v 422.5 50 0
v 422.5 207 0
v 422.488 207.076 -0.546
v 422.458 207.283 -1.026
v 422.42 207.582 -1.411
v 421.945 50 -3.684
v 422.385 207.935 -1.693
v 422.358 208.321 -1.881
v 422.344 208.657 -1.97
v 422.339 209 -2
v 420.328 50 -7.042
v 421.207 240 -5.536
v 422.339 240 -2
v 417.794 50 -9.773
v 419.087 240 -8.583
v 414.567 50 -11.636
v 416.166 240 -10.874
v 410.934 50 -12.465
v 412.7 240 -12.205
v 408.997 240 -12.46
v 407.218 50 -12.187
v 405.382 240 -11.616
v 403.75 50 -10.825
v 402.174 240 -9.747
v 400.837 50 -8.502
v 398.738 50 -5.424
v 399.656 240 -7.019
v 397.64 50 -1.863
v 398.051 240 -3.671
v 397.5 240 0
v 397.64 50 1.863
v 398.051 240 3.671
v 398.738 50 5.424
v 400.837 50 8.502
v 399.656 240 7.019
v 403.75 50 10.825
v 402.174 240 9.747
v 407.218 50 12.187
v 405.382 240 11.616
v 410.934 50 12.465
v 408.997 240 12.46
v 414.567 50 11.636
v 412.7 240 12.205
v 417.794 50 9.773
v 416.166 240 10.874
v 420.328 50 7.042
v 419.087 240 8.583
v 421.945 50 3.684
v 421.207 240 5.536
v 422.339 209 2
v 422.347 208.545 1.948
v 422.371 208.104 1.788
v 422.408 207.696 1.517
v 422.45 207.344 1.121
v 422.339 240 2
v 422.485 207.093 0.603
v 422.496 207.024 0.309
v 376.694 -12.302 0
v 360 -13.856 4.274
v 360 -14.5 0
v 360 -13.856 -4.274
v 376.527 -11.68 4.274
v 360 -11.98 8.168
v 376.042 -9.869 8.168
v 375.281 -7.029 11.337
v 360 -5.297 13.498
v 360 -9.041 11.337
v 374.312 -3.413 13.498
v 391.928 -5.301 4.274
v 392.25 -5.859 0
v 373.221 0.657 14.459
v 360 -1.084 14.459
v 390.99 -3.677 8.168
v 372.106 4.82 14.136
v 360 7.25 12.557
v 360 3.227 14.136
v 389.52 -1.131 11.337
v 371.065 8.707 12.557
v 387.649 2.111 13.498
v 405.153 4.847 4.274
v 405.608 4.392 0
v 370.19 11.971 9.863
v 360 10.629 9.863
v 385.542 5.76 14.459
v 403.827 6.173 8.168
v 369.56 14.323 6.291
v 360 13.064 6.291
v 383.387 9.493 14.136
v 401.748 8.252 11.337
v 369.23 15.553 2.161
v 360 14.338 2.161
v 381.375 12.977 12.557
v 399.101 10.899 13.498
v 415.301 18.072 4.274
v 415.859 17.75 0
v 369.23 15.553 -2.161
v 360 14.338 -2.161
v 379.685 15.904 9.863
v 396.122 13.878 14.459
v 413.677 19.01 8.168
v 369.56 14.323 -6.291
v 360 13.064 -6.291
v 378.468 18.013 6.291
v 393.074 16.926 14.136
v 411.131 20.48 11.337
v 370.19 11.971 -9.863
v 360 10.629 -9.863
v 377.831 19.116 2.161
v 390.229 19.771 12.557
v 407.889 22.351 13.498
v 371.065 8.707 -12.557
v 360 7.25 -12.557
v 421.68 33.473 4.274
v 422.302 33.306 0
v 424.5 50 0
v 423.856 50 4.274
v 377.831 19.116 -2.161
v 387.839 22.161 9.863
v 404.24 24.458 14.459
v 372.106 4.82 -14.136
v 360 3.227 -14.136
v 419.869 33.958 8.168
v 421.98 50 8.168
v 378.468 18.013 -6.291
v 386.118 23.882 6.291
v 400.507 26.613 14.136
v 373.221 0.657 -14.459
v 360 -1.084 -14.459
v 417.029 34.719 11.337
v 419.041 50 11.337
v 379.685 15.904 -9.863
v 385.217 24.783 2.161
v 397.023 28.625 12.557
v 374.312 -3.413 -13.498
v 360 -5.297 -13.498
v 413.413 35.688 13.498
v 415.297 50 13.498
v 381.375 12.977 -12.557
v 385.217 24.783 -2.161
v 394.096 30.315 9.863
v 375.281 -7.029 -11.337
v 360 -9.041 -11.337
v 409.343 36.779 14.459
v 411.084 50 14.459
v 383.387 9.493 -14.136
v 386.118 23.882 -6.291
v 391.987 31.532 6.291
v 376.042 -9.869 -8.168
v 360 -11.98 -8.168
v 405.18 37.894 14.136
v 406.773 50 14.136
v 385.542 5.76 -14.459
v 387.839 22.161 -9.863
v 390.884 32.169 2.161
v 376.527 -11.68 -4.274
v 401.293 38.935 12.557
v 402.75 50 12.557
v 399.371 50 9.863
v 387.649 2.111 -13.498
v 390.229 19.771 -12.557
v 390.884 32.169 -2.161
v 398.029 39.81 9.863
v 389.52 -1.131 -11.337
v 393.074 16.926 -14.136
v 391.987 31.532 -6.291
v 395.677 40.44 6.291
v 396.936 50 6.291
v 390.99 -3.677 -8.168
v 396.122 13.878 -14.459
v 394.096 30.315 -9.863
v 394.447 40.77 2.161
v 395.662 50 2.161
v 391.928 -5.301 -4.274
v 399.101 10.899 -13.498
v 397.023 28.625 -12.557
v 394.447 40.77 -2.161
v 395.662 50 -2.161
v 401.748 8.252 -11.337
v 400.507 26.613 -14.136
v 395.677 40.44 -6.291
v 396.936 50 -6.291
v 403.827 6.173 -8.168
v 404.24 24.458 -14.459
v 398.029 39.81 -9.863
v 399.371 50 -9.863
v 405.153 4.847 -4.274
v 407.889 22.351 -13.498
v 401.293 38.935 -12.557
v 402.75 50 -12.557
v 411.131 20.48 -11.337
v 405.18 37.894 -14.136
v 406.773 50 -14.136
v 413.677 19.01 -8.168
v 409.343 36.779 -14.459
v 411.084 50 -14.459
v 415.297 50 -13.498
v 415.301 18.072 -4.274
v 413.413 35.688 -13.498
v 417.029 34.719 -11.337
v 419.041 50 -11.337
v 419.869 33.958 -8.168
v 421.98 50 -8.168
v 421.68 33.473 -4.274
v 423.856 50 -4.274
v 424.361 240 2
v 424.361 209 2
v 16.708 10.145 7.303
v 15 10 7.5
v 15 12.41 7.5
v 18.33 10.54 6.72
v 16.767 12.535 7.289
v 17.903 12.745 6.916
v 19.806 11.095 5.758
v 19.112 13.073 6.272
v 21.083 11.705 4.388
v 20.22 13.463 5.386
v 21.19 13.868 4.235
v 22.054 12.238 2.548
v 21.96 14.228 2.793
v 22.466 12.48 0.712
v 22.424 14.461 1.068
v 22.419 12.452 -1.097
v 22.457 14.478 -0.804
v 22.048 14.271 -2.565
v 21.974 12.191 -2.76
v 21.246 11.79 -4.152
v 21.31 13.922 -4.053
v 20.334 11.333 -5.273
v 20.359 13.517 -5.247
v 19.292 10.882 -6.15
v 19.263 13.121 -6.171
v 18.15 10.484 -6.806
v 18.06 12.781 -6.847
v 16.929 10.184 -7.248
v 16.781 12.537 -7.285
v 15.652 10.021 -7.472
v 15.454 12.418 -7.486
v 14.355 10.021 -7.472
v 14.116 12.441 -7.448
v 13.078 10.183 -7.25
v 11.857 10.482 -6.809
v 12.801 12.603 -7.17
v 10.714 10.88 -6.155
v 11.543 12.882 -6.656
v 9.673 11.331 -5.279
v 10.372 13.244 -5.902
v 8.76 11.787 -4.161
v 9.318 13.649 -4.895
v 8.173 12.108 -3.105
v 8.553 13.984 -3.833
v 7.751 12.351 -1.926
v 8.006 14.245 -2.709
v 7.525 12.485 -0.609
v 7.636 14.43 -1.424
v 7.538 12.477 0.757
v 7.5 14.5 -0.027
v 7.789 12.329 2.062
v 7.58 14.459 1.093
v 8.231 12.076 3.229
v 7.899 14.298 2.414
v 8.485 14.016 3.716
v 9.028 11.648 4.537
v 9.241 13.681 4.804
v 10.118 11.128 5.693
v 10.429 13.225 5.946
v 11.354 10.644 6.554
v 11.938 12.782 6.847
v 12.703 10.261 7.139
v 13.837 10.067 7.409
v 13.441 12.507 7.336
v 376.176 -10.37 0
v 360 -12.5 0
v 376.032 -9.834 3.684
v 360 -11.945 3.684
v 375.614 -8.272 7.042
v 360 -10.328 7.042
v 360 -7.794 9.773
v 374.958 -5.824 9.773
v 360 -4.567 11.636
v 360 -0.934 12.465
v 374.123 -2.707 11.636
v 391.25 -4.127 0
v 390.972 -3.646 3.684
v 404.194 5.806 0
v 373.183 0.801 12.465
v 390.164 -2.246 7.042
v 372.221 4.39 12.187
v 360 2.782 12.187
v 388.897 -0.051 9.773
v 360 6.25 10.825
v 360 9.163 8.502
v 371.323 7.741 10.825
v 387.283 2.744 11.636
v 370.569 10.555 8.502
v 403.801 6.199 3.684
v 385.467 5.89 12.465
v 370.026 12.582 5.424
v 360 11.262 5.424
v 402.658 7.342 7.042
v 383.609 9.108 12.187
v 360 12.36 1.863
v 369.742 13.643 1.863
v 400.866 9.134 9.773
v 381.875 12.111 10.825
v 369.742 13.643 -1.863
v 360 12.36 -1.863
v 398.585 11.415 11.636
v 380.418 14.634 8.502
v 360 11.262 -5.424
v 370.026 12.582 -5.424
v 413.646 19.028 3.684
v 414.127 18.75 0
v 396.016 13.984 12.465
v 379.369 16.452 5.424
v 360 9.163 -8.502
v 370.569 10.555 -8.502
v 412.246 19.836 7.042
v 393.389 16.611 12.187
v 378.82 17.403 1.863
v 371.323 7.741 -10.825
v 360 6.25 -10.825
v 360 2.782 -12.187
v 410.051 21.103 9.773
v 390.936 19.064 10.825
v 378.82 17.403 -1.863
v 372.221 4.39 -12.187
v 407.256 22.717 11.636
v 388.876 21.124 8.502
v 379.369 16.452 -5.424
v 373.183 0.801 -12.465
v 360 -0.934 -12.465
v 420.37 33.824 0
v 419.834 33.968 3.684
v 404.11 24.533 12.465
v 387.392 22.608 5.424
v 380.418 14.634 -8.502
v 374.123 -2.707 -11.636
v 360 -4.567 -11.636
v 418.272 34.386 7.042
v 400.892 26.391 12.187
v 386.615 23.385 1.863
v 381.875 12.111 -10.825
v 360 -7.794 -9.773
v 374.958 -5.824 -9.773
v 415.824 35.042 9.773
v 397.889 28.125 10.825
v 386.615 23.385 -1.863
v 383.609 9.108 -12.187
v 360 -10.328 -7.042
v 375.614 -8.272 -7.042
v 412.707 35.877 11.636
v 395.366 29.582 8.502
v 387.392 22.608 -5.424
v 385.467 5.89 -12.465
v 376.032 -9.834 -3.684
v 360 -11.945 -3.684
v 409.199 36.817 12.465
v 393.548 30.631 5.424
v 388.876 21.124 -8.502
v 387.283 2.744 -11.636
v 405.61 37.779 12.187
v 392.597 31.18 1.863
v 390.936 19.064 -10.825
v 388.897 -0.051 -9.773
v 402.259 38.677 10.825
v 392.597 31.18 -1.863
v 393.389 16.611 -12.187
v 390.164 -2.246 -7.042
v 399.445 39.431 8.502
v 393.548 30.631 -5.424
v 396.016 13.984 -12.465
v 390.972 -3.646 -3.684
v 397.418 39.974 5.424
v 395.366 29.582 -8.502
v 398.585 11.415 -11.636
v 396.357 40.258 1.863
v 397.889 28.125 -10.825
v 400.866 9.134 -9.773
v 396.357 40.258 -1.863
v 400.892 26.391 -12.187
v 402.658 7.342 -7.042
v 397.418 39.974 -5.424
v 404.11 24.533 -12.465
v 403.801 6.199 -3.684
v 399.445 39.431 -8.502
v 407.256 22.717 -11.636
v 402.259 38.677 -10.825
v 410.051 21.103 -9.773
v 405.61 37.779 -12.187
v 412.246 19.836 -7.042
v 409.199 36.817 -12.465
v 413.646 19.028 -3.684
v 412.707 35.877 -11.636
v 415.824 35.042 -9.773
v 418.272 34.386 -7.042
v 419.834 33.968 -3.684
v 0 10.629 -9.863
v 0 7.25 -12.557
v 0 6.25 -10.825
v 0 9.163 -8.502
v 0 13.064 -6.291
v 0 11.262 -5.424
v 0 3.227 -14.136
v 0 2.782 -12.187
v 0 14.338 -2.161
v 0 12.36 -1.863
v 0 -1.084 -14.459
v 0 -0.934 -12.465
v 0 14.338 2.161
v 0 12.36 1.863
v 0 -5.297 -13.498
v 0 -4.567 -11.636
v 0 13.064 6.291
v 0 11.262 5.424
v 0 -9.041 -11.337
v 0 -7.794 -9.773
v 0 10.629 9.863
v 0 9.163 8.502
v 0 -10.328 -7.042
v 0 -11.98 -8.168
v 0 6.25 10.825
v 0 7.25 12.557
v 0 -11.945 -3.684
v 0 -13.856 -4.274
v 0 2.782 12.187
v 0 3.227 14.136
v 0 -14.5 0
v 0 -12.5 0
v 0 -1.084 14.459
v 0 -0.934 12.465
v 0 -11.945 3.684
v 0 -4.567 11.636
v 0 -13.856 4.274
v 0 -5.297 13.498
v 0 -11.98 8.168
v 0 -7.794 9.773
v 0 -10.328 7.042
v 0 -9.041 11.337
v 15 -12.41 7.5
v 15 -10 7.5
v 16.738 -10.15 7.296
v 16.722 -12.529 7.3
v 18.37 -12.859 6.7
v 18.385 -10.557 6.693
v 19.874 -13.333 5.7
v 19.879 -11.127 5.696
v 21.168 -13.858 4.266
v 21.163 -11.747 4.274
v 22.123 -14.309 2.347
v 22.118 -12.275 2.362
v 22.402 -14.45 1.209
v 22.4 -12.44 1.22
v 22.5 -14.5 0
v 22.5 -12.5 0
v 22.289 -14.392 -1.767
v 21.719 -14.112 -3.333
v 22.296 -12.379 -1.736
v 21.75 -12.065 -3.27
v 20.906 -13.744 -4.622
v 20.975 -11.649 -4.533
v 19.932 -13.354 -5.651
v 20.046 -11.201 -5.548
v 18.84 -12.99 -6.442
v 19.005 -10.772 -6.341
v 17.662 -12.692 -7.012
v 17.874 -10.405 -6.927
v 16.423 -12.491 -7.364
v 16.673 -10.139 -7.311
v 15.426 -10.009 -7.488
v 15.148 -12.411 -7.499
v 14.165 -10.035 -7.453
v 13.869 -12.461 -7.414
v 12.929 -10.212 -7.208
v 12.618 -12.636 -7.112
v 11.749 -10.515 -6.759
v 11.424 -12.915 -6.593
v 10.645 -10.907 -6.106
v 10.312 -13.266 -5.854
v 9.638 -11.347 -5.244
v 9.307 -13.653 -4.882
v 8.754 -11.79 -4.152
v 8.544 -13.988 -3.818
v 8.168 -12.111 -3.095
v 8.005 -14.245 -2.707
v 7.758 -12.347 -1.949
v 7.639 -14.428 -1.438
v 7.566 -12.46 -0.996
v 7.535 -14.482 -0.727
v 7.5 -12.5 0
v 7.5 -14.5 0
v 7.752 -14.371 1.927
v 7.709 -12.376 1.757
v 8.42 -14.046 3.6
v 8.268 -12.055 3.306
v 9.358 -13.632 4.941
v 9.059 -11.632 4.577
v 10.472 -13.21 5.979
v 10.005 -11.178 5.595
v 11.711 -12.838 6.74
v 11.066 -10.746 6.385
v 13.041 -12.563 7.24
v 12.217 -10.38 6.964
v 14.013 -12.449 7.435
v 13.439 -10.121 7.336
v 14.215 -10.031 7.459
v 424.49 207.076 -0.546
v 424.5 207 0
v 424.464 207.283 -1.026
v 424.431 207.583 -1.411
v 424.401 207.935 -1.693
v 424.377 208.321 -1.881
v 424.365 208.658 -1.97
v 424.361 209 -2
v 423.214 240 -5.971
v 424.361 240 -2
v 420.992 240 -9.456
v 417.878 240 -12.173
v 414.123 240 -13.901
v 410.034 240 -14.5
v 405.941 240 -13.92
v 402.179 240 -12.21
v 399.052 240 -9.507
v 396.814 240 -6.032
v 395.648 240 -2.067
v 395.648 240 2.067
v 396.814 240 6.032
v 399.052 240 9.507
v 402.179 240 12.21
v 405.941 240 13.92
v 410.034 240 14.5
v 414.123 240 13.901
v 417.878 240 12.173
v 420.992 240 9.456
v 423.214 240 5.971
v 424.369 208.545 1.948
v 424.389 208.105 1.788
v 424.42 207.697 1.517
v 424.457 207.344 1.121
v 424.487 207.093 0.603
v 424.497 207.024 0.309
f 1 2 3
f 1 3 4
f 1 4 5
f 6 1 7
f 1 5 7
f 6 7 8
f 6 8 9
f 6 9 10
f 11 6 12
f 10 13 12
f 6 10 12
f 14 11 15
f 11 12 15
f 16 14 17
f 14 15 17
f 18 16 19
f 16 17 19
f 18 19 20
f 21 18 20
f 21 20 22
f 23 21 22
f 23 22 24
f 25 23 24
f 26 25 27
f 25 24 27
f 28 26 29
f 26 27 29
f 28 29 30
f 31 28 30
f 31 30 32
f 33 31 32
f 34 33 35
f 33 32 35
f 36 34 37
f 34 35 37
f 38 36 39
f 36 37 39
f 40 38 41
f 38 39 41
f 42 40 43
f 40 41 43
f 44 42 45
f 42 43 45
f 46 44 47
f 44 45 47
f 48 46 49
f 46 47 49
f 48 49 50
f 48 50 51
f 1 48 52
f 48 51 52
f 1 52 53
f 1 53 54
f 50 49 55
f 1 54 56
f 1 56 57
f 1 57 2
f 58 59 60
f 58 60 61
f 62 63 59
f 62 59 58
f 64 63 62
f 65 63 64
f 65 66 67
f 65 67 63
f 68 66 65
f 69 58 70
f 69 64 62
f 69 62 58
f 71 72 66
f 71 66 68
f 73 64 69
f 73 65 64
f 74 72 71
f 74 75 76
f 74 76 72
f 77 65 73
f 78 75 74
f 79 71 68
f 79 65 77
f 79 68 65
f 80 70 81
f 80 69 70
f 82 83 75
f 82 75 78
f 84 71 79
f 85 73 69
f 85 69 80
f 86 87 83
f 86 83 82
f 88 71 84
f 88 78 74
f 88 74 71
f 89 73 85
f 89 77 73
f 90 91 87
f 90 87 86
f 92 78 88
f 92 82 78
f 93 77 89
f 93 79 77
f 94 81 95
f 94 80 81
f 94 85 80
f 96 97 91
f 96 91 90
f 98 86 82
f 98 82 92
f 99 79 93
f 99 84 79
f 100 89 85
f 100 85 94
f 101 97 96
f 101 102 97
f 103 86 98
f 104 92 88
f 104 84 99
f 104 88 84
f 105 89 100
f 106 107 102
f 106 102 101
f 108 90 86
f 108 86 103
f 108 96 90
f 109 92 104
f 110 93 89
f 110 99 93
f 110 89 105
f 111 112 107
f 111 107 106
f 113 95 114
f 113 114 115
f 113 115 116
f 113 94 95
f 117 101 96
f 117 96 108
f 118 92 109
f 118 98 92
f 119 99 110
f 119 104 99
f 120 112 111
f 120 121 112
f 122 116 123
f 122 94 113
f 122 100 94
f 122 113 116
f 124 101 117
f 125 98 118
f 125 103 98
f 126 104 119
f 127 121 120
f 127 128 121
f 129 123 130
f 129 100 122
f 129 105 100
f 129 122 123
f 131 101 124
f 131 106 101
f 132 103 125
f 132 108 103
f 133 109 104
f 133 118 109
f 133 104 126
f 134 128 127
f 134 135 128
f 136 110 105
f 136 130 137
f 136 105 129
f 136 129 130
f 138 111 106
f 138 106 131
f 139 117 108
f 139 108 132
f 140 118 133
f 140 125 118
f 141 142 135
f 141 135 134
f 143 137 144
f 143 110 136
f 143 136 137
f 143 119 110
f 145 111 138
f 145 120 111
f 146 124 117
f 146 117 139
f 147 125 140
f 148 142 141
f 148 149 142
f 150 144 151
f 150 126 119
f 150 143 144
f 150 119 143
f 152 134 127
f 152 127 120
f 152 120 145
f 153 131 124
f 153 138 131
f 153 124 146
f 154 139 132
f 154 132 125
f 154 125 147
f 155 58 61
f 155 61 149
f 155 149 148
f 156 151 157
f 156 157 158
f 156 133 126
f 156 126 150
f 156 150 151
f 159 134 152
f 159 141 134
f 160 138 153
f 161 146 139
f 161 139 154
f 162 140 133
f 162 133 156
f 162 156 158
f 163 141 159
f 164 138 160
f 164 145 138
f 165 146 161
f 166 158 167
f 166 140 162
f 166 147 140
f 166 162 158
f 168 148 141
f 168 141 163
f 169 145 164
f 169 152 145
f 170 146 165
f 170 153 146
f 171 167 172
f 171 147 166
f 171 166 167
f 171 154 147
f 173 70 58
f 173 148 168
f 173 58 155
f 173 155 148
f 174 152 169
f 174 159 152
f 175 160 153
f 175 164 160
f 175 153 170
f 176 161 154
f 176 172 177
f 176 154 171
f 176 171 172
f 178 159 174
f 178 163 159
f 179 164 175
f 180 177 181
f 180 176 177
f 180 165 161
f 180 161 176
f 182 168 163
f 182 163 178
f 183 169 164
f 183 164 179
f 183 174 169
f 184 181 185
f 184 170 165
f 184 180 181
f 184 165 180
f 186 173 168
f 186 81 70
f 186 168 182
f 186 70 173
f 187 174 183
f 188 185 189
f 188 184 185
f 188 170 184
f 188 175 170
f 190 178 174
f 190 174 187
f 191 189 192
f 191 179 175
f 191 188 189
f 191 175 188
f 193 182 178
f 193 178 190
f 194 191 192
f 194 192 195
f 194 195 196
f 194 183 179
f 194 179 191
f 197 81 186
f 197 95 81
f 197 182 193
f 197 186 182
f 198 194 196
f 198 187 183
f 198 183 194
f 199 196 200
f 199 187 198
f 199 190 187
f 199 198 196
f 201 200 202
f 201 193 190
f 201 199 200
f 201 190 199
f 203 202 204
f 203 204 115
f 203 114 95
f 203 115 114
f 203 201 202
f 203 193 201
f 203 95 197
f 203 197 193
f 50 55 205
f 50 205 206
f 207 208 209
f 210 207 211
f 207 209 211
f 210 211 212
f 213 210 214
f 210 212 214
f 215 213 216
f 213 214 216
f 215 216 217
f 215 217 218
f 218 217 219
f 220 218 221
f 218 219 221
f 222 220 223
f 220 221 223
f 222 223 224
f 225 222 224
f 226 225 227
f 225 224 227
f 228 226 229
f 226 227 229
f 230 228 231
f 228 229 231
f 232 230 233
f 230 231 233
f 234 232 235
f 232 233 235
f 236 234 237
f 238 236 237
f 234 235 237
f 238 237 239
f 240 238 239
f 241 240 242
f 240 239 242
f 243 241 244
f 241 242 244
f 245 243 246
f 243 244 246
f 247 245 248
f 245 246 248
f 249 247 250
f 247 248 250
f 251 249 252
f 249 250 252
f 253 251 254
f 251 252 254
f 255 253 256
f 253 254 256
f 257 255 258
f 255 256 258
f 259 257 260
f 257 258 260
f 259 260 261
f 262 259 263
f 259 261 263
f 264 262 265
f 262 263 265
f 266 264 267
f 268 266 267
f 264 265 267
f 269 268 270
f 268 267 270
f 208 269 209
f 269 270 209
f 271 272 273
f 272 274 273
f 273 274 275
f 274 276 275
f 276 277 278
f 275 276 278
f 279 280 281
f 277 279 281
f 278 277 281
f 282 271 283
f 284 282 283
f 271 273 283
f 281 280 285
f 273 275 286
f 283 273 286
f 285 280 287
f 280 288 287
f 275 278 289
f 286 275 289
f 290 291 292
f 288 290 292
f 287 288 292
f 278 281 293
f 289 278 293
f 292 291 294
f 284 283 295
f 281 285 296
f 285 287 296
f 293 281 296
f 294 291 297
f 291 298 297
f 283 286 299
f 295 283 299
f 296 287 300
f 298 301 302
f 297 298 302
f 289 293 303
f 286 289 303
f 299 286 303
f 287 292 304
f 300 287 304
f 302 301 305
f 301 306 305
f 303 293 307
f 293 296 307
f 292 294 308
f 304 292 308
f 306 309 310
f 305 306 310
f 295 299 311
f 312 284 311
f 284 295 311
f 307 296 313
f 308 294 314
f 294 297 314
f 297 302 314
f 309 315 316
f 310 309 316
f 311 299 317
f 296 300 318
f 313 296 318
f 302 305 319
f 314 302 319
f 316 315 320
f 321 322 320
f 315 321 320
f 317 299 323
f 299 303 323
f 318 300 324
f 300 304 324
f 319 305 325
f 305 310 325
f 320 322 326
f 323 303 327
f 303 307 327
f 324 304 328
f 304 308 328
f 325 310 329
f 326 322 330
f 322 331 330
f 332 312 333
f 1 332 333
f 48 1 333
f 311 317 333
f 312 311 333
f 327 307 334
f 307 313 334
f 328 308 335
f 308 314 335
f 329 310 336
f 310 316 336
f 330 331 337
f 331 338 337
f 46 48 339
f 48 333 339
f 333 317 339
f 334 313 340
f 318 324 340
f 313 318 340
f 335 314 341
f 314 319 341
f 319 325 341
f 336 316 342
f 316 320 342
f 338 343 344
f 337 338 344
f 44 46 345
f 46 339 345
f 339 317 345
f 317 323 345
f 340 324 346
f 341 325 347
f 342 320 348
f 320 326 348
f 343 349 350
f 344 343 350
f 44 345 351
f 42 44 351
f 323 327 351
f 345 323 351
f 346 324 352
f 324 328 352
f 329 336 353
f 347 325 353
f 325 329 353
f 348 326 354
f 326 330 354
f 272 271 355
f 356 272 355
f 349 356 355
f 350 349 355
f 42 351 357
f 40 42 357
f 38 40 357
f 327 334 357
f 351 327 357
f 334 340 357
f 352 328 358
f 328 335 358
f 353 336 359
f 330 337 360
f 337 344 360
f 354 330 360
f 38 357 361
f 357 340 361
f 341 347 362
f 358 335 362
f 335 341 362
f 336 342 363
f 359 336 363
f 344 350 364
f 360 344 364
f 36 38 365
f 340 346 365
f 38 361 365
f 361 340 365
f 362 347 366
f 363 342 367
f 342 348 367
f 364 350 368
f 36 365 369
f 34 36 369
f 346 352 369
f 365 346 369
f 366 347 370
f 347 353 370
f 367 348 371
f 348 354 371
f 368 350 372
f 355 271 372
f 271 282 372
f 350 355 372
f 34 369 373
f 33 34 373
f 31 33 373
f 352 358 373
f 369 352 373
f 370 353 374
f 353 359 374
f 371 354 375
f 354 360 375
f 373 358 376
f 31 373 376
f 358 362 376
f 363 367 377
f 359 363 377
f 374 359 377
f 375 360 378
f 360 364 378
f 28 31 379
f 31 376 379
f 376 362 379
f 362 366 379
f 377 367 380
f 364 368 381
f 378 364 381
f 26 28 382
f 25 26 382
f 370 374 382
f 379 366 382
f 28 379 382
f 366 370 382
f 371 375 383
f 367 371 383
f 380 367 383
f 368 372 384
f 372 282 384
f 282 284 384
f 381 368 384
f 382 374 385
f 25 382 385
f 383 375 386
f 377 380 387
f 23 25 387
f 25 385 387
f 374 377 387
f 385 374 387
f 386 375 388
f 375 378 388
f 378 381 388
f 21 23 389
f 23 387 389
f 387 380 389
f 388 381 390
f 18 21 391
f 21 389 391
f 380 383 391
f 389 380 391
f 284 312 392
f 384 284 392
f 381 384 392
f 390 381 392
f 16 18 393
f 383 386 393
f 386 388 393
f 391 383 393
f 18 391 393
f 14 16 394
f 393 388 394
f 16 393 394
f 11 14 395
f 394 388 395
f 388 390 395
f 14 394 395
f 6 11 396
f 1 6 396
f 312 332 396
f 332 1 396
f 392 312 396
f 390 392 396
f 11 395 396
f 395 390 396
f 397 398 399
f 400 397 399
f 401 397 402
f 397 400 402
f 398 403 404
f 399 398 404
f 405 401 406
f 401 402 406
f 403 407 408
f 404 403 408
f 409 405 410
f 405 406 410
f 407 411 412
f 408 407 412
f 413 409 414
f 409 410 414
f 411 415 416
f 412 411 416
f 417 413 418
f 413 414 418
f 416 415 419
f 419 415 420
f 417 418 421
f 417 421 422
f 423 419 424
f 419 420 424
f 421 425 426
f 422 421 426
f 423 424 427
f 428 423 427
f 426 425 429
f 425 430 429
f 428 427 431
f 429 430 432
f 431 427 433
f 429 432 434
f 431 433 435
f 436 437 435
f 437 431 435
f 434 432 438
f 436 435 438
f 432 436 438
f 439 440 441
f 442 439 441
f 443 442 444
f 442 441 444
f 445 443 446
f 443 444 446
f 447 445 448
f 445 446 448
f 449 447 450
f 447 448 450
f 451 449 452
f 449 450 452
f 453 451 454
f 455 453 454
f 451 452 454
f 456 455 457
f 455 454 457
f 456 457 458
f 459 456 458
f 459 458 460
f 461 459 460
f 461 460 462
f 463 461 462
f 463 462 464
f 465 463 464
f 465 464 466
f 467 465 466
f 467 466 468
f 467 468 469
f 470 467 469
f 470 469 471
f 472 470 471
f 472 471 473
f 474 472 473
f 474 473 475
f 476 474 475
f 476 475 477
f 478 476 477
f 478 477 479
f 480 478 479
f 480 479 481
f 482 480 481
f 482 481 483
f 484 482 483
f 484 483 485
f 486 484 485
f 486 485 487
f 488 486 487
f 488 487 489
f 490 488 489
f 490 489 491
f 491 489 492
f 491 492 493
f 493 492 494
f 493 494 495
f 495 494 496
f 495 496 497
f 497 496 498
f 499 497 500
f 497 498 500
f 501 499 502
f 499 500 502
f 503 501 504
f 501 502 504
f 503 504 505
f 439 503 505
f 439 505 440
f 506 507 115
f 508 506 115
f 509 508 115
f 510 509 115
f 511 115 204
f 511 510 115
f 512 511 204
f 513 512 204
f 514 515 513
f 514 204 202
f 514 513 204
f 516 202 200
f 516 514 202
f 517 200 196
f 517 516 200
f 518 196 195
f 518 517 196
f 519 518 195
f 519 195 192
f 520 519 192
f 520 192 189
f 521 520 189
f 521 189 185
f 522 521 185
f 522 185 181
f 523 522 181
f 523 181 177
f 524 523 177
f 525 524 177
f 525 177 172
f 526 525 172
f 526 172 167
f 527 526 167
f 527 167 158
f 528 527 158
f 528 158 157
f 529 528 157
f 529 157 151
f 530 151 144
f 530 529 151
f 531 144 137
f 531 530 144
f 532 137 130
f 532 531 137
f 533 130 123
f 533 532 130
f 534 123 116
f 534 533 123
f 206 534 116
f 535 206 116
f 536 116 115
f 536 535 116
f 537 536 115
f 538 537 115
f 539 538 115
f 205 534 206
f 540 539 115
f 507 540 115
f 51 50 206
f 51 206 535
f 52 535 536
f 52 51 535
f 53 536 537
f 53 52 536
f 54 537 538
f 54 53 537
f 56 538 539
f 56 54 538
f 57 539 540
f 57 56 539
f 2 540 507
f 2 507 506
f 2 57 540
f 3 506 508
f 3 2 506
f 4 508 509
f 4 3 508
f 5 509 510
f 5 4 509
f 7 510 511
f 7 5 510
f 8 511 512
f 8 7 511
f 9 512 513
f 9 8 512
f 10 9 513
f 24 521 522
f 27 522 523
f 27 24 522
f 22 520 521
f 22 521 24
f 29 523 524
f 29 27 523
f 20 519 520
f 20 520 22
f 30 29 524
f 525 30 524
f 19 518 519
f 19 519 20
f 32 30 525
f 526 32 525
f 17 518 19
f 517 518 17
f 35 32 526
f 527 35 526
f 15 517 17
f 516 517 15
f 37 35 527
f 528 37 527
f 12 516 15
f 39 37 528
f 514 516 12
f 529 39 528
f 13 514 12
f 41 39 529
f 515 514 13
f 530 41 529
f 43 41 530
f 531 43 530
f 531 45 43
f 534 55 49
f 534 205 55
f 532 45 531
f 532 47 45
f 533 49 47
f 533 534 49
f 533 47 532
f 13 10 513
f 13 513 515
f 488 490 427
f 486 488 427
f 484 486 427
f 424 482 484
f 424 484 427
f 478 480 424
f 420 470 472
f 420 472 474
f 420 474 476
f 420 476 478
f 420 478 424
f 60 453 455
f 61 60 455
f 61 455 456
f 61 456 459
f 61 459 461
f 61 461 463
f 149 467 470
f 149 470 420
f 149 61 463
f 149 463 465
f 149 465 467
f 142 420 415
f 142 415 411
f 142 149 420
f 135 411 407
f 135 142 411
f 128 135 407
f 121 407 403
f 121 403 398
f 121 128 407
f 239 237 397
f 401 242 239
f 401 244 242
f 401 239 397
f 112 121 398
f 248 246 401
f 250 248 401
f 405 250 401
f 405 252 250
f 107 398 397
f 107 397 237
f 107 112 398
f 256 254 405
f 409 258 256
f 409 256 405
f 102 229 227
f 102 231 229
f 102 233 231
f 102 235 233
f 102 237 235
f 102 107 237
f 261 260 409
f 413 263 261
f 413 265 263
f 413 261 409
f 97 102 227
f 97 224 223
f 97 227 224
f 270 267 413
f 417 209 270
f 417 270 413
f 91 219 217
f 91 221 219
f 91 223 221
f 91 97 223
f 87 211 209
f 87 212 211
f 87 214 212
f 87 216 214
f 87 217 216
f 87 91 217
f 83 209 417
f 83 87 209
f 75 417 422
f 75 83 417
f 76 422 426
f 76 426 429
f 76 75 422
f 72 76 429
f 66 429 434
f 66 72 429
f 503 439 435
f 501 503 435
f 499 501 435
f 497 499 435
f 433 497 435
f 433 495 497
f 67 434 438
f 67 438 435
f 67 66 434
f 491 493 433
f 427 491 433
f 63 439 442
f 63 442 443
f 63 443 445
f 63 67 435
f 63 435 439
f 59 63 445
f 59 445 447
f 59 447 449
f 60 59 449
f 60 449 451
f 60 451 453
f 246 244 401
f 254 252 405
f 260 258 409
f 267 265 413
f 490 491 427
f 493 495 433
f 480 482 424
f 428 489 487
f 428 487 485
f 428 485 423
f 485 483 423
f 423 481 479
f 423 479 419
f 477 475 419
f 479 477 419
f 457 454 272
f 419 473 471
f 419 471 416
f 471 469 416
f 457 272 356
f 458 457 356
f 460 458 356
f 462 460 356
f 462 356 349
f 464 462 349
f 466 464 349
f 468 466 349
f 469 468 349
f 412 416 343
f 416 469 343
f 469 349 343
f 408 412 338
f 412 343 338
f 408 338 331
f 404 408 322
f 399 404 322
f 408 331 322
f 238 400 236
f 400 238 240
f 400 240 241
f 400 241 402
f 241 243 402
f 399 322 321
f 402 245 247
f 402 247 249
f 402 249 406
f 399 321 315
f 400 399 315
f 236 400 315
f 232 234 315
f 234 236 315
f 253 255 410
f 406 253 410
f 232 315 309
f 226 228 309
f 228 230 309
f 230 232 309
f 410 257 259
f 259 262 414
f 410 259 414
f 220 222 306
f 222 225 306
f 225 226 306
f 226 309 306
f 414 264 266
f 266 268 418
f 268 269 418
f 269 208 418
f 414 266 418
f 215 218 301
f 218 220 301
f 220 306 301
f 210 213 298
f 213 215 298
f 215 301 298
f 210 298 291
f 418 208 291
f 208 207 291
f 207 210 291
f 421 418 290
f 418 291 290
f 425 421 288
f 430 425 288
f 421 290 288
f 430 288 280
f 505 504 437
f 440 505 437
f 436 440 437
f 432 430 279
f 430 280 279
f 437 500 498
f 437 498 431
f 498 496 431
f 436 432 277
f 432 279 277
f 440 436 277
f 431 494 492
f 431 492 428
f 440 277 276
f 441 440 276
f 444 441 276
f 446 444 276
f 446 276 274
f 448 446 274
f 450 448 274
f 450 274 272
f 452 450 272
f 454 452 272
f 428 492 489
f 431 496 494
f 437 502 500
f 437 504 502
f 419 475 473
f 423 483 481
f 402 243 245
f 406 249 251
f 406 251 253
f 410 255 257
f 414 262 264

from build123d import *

# Parameters (mm, degrees)
SKETCH_3_R          = 12.5
SHELL_7_T           = 2
CUT_EXTRUDE_4_DEPTH = 476.300168318
SKETCH_19_R         = 7.5
CUT_EXTRUDE_5_DEPTH = 25


with BuildPart() as part:
    # 掃出5: sweep along a path in 草圖1
    with BuildLine(Plane.XY) as sweep_5_path:
        Line((0, 0), (360, 0))
        ThreePointArc((360, 0), (395.355339059, 14.644660941), (410, 50))
        Line((410, 50), (410, 240))
    # 草圖3 → 掃出5 (sweep)
    with BuildSketch(Plane(origin=(60, 240, 0), x_dir=(1, 0, 0), z_dir=(0, 1, 0))):
        with Locations((350, 0)):
            Circle(SKETCH_3_R)
    sweep(path=sweep_5_path.line)

    # 薄殼7
    shell_7_openings = [part.faces().sort_by_distance(p)[0] for p in [
        (0, 0, 0),
        (410, 240, 0),
    ]]
    offset(amount=SHELL_7_T, openings=shell_7_openings, kind=Kind.INTERSECTION)

    # 草圖18 → 除料-伸長4 (cut, through all)
    with BuildSketch(Plane(origin=(410, 0, 0), x_dir=(0, 0, -1), z_dir=(1, 0, 0))):
        with BuildLine():
            Line((-2, 760.068622847), (-2, 240))
            Line((-2, 240), (-2, 209))
            ThreePointArc((-2, 209), (0, 207), (2, 209))
            Line((2, 209), (2, 240))
            Line((2, 240), (2, 760.068622847))
            Line((2, 760.068622847), (2, 1800.205868541))
            Line((2, 1800.205868541), (-2, 1800.205868541))
            Line((-2, 1800.205868541), (-2, 760.068622847))
        make_face()
    extrude(amount=CUT_EXTRUDE_4_DEPTH, mode=Mode.SUBTRACT)

    # 草圖19 → 除料-伸長5 (cut, symmetric)
    with BuildSketch(Plane(origin=(0, 0, 0), x_dir=(1, 0, 0), z_dir=(0, 1, 0))):
        with Locations(Location((15, 0, 0), (0, 0, 270))):
            Circle(SKETCH_19_R)
    extrude(amount=CUT_EXTRUDE_5_DEPTH, both=True, mode=Mode.SUBTRACT)


solid = part.part
